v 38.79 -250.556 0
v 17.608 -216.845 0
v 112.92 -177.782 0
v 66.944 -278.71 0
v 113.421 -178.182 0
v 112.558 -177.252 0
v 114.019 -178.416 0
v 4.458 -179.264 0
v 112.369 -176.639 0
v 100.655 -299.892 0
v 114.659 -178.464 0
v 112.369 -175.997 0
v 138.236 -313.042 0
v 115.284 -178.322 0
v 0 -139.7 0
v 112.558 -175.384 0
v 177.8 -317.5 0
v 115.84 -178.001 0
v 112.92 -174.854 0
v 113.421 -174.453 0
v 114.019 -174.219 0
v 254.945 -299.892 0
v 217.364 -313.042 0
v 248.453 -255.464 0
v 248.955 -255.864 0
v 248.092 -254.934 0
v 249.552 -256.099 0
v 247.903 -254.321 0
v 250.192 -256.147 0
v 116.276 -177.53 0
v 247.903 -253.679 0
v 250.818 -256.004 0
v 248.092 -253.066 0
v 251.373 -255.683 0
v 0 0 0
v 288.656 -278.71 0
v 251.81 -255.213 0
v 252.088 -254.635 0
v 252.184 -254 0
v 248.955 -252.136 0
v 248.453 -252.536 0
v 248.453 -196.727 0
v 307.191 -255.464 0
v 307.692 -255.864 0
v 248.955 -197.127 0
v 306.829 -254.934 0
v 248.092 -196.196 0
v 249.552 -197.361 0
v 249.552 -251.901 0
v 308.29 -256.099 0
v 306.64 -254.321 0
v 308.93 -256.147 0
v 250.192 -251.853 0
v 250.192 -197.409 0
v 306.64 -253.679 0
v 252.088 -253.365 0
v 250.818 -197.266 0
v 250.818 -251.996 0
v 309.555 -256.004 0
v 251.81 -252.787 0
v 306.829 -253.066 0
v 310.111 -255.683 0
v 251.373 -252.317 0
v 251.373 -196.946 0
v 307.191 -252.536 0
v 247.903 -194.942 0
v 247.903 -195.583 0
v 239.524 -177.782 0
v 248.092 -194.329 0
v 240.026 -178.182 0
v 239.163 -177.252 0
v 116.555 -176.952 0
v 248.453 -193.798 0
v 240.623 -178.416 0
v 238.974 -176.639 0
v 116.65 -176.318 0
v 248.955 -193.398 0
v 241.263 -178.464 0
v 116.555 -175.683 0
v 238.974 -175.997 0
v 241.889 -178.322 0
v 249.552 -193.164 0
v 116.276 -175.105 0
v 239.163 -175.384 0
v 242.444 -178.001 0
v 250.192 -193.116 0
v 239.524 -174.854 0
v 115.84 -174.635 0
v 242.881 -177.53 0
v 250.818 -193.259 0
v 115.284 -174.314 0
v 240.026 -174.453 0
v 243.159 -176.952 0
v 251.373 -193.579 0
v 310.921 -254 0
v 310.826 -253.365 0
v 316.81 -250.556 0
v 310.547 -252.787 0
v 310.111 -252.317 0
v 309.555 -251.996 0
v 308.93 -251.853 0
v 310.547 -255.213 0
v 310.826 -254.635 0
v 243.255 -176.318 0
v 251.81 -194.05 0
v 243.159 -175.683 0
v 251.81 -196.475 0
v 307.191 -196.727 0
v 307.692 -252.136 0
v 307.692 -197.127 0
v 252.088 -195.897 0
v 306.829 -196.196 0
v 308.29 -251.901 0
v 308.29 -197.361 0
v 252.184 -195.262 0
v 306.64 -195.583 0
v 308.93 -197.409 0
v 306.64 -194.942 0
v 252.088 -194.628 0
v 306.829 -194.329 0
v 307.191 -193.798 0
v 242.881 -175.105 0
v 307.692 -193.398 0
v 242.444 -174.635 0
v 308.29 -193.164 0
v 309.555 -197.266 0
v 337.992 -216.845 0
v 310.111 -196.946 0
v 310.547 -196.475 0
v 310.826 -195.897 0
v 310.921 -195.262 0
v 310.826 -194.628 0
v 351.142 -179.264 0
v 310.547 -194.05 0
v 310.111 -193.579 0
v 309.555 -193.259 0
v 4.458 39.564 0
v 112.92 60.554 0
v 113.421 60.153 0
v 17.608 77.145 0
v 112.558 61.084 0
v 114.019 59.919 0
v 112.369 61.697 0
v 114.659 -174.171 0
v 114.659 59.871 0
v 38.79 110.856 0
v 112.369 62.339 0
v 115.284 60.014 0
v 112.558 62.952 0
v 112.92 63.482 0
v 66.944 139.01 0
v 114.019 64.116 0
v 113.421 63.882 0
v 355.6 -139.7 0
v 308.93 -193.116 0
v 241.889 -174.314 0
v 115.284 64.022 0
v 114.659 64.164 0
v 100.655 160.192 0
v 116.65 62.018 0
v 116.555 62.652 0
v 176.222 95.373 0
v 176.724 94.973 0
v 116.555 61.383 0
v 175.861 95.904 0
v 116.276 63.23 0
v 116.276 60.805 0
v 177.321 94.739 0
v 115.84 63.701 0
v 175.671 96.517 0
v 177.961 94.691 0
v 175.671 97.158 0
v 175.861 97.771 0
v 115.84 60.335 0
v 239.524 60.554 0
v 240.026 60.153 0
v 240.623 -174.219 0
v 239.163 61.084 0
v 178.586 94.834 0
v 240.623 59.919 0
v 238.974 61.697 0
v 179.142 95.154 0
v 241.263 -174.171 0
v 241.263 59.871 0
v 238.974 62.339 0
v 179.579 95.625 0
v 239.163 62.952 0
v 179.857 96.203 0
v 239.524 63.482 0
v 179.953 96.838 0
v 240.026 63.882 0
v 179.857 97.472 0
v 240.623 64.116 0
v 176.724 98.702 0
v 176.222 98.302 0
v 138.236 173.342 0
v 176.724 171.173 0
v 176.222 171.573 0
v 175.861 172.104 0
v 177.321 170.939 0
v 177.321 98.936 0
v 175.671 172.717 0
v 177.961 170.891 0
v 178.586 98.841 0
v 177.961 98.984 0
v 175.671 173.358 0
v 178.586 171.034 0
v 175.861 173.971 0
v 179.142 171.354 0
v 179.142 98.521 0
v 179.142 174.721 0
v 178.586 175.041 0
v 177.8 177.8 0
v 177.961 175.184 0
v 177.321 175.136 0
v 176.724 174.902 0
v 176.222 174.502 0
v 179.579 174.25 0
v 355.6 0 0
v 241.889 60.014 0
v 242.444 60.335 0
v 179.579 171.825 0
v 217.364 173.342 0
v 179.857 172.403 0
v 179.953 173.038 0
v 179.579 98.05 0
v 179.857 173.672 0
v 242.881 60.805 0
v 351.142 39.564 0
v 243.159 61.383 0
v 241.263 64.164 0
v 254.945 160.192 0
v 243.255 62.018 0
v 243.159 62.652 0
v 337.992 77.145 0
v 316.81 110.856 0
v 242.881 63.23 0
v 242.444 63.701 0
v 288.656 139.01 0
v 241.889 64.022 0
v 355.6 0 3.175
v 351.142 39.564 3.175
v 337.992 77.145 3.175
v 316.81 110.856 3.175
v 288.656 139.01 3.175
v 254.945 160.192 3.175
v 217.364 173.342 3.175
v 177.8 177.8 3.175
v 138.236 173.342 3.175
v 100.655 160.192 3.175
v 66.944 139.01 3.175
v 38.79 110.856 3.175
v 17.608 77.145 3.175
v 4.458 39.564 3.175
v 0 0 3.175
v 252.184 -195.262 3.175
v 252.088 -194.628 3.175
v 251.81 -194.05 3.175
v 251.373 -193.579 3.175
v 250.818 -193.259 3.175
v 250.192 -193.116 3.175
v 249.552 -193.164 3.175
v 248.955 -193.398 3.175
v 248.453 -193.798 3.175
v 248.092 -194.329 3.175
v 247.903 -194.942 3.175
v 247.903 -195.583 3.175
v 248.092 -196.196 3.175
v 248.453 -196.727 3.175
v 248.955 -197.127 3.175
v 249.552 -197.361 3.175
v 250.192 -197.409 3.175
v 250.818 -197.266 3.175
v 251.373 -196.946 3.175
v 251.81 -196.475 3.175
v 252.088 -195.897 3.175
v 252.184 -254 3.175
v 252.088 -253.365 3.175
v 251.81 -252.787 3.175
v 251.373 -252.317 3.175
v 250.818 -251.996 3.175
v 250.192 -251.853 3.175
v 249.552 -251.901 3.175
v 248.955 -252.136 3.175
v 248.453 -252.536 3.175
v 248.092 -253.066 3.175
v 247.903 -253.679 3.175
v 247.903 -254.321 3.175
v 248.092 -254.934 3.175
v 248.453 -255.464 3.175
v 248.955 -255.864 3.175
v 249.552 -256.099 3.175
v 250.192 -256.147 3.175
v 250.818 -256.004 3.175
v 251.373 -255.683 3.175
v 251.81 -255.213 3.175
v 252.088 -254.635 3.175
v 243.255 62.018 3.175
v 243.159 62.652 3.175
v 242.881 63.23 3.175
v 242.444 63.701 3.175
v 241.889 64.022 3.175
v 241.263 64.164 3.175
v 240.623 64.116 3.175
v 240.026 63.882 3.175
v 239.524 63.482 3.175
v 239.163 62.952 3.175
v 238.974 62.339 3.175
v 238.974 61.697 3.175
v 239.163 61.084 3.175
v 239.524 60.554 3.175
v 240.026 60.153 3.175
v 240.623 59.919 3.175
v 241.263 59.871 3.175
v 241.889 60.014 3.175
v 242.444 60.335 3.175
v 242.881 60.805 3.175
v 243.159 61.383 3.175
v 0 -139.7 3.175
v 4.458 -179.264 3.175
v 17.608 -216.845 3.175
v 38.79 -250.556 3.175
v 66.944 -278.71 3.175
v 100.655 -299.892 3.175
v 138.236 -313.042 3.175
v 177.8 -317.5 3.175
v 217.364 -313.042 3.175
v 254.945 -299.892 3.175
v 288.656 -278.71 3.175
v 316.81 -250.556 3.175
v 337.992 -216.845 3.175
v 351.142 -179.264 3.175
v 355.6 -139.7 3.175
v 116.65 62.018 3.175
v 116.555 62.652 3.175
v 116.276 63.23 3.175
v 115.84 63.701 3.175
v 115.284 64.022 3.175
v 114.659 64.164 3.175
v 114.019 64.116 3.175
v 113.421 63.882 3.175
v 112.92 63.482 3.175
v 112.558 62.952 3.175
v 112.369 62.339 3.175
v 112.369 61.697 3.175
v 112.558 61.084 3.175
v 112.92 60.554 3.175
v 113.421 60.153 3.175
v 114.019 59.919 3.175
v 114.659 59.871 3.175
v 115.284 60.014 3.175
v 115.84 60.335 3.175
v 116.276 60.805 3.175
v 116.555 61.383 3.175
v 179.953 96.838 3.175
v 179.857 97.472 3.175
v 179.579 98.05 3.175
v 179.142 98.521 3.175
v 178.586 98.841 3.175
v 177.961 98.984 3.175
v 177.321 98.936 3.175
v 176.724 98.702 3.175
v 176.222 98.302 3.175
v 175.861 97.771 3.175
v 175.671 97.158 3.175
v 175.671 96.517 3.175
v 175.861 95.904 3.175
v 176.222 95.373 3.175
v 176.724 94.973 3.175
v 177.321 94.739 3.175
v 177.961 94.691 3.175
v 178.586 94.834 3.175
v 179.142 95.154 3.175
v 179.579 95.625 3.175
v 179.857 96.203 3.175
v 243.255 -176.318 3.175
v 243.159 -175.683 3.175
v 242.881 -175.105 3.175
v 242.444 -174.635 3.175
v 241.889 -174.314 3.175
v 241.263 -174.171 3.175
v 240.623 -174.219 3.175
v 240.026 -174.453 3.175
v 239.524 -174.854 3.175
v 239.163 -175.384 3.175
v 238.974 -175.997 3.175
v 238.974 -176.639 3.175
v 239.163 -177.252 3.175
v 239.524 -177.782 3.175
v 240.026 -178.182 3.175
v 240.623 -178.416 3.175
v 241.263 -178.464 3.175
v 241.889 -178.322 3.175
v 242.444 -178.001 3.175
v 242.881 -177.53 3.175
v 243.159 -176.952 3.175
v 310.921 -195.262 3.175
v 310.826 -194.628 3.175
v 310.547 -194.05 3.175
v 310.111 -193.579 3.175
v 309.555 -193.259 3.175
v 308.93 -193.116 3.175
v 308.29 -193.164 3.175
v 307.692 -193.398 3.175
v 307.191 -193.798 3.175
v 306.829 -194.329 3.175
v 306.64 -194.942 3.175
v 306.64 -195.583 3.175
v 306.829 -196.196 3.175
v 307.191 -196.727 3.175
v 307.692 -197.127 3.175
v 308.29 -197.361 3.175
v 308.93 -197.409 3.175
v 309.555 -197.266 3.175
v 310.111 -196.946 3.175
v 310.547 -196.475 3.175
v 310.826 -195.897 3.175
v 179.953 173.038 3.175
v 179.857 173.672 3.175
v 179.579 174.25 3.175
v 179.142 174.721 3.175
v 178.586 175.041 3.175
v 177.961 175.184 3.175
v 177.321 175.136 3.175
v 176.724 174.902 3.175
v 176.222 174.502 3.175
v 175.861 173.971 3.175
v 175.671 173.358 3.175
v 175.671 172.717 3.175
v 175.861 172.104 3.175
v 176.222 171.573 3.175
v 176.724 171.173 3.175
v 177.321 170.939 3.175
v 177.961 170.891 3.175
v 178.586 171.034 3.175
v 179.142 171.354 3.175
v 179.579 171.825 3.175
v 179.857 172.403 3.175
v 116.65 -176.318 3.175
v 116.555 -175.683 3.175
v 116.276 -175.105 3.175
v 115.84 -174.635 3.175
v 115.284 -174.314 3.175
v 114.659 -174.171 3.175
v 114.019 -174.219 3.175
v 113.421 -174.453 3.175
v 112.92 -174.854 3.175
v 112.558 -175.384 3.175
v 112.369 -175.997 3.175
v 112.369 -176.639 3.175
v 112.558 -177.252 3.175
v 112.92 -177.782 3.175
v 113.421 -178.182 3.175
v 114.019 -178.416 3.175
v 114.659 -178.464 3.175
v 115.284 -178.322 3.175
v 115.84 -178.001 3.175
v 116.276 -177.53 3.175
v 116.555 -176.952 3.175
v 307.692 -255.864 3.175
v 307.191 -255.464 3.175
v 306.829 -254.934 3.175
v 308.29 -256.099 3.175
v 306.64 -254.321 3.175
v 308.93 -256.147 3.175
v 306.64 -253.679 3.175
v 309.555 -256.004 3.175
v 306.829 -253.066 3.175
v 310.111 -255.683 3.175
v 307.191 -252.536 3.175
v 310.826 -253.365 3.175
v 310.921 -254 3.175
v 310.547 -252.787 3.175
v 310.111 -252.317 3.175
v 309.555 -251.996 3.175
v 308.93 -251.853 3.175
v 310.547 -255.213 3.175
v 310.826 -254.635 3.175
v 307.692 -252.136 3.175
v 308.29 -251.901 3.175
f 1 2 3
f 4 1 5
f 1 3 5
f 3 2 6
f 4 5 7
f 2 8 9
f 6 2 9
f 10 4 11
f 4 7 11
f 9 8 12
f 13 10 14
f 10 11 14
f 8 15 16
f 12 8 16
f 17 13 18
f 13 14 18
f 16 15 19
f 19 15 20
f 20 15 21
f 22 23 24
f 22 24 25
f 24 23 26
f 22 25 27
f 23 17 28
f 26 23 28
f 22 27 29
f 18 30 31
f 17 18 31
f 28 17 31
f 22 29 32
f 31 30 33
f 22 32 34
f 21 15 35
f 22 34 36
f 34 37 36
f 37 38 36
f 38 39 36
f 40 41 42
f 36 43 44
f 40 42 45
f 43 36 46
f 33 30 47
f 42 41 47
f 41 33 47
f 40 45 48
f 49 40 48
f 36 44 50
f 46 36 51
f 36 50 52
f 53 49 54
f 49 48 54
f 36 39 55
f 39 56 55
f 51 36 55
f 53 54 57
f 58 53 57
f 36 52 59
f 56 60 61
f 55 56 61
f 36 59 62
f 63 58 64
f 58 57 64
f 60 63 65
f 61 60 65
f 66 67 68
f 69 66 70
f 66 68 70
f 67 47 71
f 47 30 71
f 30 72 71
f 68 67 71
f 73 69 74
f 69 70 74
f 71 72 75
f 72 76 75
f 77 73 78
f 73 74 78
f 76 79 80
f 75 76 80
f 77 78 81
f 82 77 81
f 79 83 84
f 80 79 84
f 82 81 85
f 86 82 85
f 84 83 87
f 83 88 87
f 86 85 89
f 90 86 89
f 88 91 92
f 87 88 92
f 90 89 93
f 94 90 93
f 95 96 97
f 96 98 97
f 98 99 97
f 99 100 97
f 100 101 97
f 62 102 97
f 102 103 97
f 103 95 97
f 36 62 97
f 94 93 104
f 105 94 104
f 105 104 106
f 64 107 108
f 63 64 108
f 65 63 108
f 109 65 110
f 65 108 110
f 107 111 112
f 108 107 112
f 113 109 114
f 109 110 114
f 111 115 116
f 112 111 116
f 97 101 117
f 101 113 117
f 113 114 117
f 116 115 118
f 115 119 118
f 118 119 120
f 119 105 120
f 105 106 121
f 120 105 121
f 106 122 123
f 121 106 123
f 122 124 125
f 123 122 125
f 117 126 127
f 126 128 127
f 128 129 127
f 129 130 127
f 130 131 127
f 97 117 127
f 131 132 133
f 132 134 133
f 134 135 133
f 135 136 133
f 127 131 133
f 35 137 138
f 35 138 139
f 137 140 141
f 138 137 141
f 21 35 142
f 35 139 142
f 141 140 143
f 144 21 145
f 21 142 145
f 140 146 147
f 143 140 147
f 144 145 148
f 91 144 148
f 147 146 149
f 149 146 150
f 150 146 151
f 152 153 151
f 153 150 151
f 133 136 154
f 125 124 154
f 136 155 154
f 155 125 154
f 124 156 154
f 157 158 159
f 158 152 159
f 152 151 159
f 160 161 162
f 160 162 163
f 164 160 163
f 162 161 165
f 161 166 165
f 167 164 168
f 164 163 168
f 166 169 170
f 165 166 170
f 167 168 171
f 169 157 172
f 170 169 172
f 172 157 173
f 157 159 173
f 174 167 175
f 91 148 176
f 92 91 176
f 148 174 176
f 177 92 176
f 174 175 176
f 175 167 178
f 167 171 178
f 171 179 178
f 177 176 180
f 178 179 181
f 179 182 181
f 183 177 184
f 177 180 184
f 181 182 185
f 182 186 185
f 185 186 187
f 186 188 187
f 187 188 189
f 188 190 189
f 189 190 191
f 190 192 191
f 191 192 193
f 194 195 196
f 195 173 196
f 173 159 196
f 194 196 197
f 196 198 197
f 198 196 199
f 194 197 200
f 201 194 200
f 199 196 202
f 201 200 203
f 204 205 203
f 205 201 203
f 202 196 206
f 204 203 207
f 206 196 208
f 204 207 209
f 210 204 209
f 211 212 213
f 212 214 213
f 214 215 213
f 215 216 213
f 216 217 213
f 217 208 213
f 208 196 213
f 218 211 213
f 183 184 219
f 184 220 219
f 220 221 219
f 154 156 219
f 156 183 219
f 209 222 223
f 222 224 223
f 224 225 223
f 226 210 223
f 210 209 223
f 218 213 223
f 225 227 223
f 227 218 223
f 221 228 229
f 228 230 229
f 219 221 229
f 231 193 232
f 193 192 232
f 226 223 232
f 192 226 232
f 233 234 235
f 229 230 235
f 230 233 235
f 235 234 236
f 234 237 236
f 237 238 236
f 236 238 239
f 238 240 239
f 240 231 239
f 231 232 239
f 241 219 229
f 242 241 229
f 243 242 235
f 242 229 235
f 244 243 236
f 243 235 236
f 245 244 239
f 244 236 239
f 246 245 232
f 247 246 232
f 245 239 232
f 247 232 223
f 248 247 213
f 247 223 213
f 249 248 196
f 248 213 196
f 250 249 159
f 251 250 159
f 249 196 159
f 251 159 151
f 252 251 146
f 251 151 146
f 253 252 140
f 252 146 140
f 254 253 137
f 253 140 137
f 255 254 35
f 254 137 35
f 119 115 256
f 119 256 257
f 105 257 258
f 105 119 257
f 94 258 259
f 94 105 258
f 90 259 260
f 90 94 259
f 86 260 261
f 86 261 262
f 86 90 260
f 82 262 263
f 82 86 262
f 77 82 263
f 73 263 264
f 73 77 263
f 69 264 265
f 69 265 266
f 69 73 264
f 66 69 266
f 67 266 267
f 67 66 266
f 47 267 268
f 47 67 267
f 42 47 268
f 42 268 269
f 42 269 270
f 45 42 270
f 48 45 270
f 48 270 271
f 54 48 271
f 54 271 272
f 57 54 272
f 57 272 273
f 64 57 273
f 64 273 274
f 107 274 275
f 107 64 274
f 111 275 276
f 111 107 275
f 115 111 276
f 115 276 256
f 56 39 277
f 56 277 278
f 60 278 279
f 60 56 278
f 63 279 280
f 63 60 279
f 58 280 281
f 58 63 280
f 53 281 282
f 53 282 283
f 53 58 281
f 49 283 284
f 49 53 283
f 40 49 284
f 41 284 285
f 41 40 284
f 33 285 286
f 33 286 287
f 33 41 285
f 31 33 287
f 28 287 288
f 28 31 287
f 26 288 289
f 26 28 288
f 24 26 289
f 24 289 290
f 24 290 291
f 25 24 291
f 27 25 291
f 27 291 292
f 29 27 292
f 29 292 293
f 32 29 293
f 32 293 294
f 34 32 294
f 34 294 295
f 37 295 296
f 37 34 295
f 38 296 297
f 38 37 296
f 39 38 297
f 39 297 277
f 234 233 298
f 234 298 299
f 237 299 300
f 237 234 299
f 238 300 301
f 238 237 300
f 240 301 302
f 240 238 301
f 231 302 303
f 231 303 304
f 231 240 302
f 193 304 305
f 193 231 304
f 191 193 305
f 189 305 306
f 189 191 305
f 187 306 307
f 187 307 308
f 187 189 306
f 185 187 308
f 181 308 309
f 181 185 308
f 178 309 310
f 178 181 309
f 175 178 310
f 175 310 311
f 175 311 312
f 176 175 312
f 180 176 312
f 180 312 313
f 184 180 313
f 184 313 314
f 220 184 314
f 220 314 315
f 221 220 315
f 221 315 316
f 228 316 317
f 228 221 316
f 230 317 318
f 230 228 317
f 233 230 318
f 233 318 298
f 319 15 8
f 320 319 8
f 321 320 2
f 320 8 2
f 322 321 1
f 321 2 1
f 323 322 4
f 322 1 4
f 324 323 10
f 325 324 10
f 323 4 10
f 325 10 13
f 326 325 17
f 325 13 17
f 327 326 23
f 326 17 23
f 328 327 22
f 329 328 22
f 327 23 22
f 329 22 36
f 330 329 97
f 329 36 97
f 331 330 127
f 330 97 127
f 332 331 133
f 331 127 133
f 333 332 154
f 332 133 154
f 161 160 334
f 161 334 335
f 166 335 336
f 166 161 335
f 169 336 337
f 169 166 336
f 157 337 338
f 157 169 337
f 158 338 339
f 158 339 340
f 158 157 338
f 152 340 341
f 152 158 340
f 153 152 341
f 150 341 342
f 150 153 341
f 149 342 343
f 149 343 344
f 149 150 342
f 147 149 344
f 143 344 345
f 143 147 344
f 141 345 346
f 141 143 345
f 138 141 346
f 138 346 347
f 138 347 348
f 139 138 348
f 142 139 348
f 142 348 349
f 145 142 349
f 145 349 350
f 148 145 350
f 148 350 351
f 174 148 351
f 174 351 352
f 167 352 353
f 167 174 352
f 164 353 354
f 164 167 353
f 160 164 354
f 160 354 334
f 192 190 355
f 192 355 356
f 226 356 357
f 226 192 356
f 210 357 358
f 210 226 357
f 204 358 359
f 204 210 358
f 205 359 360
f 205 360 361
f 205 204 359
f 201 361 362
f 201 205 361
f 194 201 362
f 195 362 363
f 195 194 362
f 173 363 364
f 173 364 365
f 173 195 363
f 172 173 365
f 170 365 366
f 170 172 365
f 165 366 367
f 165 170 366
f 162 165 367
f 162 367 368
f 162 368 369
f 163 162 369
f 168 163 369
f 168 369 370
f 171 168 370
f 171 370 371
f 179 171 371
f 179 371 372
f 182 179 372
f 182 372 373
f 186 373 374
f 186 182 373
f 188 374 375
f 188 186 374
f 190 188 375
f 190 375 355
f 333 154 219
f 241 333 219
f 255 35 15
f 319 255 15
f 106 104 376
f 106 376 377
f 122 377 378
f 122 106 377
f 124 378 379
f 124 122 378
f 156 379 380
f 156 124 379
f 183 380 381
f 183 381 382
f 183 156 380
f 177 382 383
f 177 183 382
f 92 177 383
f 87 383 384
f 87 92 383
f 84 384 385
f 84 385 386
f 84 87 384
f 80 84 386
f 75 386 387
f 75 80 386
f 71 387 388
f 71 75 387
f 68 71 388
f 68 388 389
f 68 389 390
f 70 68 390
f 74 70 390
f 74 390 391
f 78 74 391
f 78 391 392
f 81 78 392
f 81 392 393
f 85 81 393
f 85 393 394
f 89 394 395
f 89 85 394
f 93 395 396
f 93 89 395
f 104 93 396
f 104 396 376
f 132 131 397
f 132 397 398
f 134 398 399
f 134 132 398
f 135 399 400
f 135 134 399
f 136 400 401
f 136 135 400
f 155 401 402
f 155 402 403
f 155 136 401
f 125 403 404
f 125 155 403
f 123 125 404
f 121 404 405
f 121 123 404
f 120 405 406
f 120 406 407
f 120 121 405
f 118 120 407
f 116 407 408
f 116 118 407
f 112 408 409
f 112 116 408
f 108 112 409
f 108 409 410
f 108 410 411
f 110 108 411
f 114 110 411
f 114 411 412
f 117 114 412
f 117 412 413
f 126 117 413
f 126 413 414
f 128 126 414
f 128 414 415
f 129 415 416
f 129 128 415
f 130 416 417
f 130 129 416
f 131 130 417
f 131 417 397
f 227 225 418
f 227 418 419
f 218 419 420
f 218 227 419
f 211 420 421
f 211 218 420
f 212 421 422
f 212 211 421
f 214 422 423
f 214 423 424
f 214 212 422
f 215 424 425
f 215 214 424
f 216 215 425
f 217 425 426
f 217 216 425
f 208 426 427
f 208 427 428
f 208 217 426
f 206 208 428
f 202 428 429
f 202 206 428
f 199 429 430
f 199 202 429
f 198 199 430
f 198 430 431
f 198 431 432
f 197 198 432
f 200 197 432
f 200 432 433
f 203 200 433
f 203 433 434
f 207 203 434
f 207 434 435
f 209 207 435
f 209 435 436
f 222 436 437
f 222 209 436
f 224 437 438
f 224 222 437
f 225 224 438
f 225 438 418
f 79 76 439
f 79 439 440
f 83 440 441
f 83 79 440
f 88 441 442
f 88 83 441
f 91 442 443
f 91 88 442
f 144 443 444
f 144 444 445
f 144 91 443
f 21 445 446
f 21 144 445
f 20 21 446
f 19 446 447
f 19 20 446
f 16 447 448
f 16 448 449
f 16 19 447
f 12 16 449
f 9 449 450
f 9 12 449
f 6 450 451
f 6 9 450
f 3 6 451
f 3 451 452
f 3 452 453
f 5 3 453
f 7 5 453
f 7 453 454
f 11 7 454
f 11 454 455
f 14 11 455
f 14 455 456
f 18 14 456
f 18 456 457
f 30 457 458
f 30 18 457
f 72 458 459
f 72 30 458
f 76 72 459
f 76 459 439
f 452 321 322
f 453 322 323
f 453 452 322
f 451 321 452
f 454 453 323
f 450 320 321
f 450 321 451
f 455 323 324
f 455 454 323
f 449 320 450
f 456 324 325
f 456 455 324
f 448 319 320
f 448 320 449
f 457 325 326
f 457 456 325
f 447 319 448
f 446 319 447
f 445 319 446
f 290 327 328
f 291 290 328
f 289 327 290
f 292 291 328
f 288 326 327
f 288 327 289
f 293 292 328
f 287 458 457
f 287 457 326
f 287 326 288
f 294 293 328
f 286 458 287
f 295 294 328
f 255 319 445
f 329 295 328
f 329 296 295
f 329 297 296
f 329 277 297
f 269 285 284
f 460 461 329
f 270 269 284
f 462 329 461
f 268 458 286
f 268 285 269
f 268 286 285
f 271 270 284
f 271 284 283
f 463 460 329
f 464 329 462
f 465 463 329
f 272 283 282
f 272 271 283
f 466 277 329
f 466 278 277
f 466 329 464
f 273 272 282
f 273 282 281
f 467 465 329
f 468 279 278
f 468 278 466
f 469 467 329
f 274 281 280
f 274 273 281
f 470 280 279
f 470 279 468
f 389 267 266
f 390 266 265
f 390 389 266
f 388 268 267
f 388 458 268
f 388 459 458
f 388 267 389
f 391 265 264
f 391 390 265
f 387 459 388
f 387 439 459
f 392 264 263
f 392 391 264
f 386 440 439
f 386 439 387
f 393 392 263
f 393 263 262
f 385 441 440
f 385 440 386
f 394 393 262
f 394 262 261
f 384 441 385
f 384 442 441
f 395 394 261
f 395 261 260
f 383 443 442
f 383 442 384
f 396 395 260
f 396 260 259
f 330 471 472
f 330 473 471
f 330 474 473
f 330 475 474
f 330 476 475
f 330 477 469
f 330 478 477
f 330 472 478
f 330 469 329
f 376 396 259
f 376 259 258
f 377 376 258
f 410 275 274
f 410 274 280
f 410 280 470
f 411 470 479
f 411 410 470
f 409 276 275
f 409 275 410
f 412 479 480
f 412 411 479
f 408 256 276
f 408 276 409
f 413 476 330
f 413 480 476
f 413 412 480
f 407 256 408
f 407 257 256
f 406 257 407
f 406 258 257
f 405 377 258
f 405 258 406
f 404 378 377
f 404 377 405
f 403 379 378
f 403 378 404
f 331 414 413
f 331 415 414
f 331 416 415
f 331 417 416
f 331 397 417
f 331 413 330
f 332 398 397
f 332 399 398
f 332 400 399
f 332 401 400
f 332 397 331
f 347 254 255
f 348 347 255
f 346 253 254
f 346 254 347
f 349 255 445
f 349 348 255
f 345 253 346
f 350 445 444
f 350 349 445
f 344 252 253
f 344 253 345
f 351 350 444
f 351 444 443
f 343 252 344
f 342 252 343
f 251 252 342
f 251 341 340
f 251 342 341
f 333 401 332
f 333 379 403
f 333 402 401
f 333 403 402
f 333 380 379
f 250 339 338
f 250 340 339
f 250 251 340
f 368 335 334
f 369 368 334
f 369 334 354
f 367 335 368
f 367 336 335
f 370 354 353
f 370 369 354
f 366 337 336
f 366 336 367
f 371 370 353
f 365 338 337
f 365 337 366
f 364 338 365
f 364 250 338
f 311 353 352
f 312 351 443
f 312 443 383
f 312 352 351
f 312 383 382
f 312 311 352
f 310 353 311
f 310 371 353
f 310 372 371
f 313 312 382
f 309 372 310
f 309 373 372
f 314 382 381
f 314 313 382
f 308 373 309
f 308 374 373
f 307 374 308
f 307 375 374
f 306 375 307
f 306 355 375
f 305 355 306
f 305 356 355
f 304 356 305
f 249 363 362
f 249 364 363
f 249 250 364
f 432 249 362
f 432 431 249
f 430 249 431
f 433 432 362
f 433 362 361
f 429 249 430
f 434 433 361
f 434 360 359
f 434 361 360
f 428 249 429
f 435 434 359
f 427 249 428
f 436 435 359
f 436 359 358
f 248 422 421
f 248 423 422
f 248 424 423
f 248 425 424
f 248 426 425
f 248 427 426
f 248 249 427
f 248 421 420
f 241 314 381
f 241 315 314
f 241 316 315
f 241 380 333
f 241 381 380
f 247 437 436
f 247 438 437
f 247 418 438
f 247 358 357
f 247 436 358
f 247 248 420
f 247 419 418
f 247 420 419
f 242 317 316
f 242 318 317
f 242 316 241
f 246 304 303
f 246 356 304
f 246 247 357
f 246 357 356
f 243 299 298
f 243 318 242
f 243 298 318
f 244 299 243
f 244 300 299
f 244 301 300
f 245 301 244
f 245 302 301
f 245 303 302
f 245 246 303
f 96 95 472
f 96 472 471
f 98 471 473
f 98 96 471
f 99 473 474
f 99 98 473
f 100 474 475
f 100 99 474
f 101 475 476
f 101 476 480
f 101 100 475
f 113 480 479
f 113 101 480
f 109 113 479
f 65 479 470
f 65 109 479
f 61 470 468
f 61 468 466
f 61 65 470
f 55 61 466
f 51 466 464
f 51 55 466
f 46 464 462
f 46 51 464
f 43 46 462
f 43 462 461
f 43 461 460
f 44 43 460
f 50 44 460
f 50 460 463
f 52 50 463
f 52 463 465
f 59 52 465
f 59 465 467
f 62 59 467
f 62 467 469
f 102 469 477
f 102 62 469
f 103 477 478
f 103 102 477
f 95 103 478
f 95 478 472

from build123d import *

# Parameters (mm, degrees)
F0_R     = 2.15265
F1_DEPTH = 3.175


with BuildPart() as f1:
    # F0 (on Top) → F1 (new body)
    with BuildSketch(Plane.XY):
        with BuildLine():
            ThreePointArc((355.6, 0), (177.8, 177.8), (0, 0))
            Line((0, 0), (0, -139.7))
            ThreePointArc((0, -139.7), (177.8, -317.5), (355.6, -139.7))
            Line((355.6, -139.7), (355.6, 0))
        make_face()
        with Locations((114.497731, -176.317746)):
            Circle(F0_R, mode=Mode.SUBTRACT)
        with Locations((250.03125, -254)):
            Circle(F0_R, mode=Mode.SUBTRACT)
        with Locations((250.03125, -195.2625)):
            Circle(F0_R, mode=Mode.SUBTRACT)
        with Locations((308.76875, -254)):
            Circle(F0_R, mode=Mode.SUBTRACT)
        with Locations((308.76875, -195.2625)):
            Circle(F0_R, mode=Mode.SUBTRACT)
        with Locations((241.102269, -176.317746)):
            Circle(F0_R, mode=Mode.SUBTRACT)
        with Locations((114.497731, 62.017746)):
            Circle(F0_R, mode=Mode.SUBTRACT)
        with Locations((177.8, 96.8375)):
            Circle(F0_R, mode=Mode.SUBTRACT)
        with Locations((241.102269, 62.017746)):
            Circle(F0_R, mode=Mode.SUBTRACT)
        with Locations((177.8, 173.0375)):
            Circle(F0_R, mode=Mode.SUBTRACT)
    extrude(amount=F1_DEPTH)


solid = f1.part
